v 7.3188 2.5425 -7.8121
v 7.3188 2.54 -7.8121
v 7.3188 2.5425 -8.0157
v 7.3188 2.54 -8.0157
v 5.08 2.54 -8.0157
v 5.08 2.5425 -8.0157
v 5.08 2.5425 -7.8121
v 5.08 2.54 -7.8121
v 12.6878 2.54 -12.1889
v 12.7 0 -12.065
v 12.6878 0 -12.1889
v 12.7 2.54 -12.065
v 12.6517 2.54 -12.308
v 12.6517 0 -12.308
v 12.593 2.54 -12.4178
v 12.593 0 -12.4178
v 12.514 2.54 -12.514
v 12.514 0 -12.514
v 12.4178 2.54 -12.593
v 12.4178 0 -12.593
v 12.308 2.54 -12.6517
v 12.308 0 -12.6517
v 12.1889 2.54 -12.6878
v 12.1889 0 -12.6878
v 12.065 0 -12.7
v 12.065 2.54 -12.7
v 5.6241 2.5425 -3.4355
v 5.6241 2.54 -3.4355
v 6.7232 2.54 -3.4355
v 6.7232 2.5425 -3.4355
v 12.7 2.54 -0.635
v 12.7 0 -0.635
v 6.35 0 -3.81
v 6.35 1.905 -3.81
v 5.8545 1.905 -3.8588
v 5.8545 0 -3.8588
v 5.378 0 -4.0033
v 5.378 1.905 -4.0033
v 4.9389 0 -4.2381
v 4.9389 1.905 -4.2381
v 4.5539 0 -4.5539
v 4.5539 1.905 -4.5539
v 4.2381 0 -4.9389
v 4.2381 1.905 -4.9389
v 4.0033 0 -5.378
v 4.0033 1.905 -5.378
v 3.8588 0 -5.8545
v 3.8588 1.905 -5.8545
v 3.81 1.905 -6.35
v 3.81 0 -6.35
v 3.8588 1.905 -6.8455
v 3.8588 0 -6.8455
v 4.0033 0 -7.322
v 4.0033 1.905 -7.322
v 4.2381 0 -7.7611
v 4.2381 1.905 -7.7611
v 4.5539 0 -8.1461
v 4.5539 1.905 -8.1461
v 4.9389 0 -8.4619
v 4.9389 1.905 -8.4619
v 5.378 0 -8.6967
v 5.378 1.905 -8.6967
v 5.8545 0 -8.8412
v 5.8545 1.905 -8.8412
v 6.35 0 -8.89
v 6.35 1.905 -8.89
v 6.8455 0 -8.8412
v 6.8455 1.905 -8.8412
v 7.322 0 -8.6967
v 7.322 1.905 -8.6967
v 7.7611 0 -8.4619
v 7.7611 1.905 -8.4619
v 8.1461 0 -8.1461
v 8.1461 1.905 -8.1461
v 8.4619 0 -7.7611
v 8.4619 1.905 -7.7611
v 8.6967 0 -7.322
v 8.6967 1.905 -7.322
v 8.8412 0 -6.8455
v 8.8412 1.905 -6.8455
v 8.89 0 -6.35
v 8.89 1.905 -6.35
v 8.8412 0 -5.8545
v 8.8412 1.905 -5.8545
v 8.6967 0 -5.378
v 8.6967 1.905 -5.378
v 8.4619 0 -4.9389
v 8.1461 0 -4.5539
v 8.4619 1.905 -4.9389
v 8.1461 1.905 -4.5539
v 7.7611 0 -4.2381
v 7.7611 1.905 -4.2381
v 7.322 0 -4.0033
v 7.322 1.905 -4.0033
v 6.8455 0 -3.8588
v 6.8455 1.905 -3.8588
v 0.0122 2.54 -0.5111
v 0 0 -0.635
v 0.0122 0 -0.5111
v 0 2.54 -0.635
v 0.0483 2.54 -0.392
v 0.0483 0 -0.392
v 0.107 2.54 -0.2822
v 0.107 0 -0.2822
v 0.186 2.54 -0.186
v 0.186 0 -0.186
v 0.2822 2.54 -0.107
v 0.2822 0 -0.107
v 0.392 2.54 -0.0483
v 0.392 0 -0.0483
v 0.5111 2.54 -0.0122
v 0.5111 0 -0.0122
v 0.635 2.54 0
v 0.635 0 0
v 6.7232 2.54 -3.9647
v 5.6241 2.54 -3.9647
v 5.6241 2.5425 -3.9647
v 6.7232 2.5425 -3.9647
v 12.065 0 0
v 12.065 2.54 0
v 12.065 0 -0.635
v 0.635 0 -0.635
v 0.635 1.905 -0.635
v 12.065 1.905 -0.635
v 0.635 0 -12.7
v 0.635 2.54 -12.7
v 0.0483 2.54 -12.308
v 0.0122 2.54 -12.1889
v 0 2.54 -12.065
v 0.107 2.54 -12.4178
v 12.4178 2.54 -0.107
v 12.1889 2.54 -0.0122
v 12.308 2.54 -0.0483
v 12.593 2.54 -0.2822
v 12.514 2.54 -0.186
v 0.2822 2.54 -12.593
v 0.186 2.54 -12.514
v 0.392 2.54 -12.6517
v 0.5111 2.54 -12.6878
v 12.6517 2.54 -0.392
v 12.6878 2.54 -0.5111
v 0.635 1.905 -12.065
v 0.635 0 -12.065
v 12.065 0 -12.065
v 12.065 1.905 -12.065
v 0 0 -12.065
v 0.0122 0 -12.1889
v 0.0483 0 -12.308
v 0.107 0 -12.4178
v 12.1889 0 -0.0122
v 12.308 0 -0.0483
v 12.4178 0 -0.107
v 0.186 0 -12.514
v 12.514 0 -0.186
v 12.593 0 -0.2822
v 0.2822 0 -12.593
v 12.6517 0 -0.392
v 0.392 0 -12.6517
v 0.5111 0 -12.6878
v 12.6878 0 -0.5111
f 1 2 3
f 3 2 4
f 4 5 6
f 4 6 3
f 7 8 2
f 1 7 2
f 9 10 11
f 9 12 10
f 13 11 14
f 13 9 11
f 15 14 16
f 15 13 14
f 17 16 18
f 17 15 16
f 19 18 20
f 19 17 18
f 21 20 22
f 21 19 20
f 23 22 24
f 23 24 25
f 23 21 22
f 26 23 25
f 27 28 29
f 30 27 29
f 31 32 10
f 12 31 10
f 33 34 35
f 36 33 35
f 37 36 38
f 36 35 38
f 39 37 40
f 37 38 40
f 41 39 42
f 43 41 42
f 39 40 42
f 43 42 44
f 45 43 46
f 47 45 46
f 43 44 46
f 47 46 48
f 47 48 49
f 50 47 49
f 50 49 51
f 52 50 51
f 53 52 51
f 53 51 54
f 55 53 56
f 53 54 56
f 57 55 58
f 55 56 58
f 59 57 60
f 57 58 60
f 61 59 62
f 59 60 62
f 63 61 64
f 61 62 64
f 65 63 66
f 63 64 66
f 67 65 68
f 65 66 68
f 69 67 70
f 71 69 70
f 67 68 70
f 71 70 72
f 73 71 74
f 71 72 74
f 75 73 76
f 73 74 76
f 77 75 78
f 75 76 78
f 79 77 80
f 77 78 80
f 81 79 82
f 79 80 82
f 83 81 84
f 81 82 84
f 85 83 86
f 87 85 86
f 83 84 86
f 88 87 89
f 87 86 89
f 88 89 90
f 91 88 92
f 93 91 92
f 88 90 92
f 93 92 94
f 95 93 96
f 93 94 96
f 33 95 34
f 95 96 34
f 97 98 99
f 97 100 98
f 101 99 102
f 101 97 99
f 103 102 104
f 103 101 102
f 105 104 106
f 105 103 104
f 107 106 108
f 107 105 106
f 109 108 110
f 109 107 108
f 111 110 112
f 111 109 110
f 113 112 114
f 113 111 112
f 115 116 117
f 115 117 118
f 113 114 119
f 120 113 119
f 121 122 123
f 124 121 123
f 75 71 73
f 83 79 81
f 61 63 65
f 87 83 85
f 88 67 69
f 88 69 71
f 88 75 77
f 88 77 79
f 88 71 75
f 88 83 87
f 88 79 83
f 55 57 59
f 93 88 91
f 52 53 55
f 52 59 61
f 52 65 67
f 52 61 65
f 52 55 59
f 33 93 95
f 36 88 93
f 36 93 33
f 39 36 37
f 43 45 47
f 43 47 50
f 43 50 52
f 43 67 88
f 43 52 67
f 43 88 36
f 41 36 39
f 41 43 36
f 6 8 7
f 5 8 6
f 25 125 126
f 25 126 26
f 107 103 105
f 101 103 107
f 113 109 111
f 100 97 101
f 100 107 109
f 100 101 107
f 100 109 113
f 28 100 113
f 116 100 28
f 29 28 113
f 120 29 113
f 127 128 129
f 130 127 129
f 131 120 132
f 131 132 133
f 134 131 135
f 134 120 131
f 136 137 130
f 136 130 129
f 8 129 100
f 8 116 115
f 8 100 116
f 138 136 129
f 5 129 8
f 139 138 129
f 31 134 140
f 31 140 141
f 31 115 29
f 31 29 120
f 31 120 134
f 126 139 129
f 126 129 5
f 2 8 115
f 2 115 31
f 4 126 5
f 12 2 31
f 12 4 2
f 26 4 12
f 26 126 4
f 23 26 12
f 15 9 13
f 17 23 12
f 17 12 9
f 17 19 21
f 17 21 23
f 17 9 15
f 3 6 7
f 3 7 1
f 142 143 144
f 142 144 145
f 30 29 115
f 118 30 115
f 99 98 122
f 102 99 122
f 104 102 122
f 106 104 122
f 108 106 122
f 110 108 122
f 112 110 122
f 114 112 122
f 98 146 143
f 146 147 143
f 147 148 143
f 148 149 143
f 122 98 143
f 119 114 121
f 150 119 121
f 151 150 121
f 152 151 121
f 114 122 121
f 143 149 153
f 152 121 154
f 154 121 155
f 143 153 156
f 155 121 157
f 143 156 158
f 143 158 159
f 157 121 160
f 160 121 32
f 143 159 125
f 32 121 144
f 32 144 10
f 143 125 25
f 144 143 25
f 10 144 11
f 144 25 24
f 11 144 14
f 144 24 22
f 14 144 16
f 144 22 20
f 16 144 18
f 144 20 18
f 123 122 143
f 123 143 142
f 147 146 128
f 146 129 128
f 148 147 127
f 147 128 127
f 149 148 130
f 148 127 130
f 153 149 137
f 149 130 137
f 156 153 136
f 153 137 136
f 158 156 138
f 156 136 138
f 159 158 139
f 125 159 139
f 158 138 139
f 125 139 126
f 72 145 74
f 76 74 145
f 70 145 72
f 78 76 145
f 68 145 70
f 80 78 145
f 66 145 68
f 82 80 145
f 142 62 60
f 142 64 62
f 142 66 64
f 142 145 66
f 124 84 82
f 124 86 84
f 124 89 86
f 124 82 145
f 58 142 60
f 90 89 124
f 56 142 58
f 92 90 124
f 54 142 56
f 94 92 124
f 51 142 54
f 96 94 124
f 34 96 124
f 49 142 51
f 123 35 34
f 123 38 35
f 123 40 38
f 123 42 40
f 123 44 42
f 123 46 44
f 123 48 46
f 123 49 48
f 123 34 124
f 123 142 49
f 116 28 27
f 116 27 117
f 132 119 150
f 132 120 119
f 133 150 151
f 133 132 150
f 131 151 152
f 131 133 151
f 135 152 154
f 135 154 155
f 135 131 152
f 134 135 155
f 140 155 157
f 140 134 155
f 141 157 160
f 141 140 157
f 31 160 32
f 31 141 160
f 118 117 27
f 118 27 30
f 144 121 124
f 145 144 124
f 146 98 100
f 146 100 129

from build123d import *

# Parameters (mm, degrees)
SKETCH1_W           = 12.7
SKETCH1_H           = 12.7
BOSS_EXTRUDE1_DEPTH = 2.54
FILLET1_R           = 0.635
SHELL1_START        = 0.635
SHELL1_OUTLINE_W    = 1.905
SHELL1_OUTLINE_H    = 11.43
SHELL1_DEPTH        = 11.43
SKETCH2_R           = 2.54
BOSS_EXTRUDE2_DEPTH = 1.905
SKETCH4_W           = 1.099038461
SKETCH4_H           = 0.529166666
SKETCH4_W_2         = 2.238782051
SKETCH4_H_2         = 0.203525641
BOSS_EXTRUDE4_DEPTH = 0.00254


# Read off the part's stored shape, not the designer's step: Shell1
with BuildPart() as part:
    # Sketch1 → Boss-Extrude1 (new body)
    with BuildSketch(Plane(origin=(0, 0, 0), x_dir=(1, 0, 0), z_dir=(0, 1, 0))):
        with Locations((6.35, 6.35)):
            Rectangle(SKETCH1_W, SKETCH1_H)
    extrude(amount=BOSS_EXTRUDE1_DEPTH)

    # Fillet1
    fillet1_edges = [part.edges().sort_by_distance(p)[0] for p in [
        (0, 1.27, -12.7),
        (12.7, 1.27, -12.7),
        (12.7, 1.27, 0),
        (0, 1.27, 0),
    ]]
    fillet(fillet1_edges, radius=FILLET1_R)

    # Shell1 outline → Shell1 (cut)
    with BuildSketch(Plane.YZ.offset(SHELL1_START)):
        with Locations((0.9525, -6.35)):
            Rectangle(SHELL1_OUTLINE_W, SHELL1_OUTLINE_H)
    extrude(amount=SHELL1_DEPTH, mode=Mode.SUBTRACT)

    # Sketch2 → Boss-Extrude2 (add)
    with BuildSketch(Plane(origin=(0, 1.905, 0), x_dir=(-1, 0, 0), z_dir=(0, -1, 0))):
        with Locations(Location((-6.35, 6.35, 0), (0, 0, 270))):
            Circle(SKETCH2_R)
    extrude(amount=BOSS_EXTRUDE2_DEPTH)

    # Sketch4 → Boss-Extrude4 (add)
    with BuildSketch(Plane(origin=(0, 2.54, 0), x_dir=(1, 0, 0), z_dir=(0, 1, 0))):
        with Locations((6.173665384, 3.700096154)):
            Rectangle(SKETCH4_W, SKETCH4_H)
        with Locations((6.199391026, 7.913891026)):
            Rectangle(SKETCH4_W_2, SKETCH4_H_2)
    extrude(amount=BOSS_EXTRUDE4_DEPTH)


solid = part.part
